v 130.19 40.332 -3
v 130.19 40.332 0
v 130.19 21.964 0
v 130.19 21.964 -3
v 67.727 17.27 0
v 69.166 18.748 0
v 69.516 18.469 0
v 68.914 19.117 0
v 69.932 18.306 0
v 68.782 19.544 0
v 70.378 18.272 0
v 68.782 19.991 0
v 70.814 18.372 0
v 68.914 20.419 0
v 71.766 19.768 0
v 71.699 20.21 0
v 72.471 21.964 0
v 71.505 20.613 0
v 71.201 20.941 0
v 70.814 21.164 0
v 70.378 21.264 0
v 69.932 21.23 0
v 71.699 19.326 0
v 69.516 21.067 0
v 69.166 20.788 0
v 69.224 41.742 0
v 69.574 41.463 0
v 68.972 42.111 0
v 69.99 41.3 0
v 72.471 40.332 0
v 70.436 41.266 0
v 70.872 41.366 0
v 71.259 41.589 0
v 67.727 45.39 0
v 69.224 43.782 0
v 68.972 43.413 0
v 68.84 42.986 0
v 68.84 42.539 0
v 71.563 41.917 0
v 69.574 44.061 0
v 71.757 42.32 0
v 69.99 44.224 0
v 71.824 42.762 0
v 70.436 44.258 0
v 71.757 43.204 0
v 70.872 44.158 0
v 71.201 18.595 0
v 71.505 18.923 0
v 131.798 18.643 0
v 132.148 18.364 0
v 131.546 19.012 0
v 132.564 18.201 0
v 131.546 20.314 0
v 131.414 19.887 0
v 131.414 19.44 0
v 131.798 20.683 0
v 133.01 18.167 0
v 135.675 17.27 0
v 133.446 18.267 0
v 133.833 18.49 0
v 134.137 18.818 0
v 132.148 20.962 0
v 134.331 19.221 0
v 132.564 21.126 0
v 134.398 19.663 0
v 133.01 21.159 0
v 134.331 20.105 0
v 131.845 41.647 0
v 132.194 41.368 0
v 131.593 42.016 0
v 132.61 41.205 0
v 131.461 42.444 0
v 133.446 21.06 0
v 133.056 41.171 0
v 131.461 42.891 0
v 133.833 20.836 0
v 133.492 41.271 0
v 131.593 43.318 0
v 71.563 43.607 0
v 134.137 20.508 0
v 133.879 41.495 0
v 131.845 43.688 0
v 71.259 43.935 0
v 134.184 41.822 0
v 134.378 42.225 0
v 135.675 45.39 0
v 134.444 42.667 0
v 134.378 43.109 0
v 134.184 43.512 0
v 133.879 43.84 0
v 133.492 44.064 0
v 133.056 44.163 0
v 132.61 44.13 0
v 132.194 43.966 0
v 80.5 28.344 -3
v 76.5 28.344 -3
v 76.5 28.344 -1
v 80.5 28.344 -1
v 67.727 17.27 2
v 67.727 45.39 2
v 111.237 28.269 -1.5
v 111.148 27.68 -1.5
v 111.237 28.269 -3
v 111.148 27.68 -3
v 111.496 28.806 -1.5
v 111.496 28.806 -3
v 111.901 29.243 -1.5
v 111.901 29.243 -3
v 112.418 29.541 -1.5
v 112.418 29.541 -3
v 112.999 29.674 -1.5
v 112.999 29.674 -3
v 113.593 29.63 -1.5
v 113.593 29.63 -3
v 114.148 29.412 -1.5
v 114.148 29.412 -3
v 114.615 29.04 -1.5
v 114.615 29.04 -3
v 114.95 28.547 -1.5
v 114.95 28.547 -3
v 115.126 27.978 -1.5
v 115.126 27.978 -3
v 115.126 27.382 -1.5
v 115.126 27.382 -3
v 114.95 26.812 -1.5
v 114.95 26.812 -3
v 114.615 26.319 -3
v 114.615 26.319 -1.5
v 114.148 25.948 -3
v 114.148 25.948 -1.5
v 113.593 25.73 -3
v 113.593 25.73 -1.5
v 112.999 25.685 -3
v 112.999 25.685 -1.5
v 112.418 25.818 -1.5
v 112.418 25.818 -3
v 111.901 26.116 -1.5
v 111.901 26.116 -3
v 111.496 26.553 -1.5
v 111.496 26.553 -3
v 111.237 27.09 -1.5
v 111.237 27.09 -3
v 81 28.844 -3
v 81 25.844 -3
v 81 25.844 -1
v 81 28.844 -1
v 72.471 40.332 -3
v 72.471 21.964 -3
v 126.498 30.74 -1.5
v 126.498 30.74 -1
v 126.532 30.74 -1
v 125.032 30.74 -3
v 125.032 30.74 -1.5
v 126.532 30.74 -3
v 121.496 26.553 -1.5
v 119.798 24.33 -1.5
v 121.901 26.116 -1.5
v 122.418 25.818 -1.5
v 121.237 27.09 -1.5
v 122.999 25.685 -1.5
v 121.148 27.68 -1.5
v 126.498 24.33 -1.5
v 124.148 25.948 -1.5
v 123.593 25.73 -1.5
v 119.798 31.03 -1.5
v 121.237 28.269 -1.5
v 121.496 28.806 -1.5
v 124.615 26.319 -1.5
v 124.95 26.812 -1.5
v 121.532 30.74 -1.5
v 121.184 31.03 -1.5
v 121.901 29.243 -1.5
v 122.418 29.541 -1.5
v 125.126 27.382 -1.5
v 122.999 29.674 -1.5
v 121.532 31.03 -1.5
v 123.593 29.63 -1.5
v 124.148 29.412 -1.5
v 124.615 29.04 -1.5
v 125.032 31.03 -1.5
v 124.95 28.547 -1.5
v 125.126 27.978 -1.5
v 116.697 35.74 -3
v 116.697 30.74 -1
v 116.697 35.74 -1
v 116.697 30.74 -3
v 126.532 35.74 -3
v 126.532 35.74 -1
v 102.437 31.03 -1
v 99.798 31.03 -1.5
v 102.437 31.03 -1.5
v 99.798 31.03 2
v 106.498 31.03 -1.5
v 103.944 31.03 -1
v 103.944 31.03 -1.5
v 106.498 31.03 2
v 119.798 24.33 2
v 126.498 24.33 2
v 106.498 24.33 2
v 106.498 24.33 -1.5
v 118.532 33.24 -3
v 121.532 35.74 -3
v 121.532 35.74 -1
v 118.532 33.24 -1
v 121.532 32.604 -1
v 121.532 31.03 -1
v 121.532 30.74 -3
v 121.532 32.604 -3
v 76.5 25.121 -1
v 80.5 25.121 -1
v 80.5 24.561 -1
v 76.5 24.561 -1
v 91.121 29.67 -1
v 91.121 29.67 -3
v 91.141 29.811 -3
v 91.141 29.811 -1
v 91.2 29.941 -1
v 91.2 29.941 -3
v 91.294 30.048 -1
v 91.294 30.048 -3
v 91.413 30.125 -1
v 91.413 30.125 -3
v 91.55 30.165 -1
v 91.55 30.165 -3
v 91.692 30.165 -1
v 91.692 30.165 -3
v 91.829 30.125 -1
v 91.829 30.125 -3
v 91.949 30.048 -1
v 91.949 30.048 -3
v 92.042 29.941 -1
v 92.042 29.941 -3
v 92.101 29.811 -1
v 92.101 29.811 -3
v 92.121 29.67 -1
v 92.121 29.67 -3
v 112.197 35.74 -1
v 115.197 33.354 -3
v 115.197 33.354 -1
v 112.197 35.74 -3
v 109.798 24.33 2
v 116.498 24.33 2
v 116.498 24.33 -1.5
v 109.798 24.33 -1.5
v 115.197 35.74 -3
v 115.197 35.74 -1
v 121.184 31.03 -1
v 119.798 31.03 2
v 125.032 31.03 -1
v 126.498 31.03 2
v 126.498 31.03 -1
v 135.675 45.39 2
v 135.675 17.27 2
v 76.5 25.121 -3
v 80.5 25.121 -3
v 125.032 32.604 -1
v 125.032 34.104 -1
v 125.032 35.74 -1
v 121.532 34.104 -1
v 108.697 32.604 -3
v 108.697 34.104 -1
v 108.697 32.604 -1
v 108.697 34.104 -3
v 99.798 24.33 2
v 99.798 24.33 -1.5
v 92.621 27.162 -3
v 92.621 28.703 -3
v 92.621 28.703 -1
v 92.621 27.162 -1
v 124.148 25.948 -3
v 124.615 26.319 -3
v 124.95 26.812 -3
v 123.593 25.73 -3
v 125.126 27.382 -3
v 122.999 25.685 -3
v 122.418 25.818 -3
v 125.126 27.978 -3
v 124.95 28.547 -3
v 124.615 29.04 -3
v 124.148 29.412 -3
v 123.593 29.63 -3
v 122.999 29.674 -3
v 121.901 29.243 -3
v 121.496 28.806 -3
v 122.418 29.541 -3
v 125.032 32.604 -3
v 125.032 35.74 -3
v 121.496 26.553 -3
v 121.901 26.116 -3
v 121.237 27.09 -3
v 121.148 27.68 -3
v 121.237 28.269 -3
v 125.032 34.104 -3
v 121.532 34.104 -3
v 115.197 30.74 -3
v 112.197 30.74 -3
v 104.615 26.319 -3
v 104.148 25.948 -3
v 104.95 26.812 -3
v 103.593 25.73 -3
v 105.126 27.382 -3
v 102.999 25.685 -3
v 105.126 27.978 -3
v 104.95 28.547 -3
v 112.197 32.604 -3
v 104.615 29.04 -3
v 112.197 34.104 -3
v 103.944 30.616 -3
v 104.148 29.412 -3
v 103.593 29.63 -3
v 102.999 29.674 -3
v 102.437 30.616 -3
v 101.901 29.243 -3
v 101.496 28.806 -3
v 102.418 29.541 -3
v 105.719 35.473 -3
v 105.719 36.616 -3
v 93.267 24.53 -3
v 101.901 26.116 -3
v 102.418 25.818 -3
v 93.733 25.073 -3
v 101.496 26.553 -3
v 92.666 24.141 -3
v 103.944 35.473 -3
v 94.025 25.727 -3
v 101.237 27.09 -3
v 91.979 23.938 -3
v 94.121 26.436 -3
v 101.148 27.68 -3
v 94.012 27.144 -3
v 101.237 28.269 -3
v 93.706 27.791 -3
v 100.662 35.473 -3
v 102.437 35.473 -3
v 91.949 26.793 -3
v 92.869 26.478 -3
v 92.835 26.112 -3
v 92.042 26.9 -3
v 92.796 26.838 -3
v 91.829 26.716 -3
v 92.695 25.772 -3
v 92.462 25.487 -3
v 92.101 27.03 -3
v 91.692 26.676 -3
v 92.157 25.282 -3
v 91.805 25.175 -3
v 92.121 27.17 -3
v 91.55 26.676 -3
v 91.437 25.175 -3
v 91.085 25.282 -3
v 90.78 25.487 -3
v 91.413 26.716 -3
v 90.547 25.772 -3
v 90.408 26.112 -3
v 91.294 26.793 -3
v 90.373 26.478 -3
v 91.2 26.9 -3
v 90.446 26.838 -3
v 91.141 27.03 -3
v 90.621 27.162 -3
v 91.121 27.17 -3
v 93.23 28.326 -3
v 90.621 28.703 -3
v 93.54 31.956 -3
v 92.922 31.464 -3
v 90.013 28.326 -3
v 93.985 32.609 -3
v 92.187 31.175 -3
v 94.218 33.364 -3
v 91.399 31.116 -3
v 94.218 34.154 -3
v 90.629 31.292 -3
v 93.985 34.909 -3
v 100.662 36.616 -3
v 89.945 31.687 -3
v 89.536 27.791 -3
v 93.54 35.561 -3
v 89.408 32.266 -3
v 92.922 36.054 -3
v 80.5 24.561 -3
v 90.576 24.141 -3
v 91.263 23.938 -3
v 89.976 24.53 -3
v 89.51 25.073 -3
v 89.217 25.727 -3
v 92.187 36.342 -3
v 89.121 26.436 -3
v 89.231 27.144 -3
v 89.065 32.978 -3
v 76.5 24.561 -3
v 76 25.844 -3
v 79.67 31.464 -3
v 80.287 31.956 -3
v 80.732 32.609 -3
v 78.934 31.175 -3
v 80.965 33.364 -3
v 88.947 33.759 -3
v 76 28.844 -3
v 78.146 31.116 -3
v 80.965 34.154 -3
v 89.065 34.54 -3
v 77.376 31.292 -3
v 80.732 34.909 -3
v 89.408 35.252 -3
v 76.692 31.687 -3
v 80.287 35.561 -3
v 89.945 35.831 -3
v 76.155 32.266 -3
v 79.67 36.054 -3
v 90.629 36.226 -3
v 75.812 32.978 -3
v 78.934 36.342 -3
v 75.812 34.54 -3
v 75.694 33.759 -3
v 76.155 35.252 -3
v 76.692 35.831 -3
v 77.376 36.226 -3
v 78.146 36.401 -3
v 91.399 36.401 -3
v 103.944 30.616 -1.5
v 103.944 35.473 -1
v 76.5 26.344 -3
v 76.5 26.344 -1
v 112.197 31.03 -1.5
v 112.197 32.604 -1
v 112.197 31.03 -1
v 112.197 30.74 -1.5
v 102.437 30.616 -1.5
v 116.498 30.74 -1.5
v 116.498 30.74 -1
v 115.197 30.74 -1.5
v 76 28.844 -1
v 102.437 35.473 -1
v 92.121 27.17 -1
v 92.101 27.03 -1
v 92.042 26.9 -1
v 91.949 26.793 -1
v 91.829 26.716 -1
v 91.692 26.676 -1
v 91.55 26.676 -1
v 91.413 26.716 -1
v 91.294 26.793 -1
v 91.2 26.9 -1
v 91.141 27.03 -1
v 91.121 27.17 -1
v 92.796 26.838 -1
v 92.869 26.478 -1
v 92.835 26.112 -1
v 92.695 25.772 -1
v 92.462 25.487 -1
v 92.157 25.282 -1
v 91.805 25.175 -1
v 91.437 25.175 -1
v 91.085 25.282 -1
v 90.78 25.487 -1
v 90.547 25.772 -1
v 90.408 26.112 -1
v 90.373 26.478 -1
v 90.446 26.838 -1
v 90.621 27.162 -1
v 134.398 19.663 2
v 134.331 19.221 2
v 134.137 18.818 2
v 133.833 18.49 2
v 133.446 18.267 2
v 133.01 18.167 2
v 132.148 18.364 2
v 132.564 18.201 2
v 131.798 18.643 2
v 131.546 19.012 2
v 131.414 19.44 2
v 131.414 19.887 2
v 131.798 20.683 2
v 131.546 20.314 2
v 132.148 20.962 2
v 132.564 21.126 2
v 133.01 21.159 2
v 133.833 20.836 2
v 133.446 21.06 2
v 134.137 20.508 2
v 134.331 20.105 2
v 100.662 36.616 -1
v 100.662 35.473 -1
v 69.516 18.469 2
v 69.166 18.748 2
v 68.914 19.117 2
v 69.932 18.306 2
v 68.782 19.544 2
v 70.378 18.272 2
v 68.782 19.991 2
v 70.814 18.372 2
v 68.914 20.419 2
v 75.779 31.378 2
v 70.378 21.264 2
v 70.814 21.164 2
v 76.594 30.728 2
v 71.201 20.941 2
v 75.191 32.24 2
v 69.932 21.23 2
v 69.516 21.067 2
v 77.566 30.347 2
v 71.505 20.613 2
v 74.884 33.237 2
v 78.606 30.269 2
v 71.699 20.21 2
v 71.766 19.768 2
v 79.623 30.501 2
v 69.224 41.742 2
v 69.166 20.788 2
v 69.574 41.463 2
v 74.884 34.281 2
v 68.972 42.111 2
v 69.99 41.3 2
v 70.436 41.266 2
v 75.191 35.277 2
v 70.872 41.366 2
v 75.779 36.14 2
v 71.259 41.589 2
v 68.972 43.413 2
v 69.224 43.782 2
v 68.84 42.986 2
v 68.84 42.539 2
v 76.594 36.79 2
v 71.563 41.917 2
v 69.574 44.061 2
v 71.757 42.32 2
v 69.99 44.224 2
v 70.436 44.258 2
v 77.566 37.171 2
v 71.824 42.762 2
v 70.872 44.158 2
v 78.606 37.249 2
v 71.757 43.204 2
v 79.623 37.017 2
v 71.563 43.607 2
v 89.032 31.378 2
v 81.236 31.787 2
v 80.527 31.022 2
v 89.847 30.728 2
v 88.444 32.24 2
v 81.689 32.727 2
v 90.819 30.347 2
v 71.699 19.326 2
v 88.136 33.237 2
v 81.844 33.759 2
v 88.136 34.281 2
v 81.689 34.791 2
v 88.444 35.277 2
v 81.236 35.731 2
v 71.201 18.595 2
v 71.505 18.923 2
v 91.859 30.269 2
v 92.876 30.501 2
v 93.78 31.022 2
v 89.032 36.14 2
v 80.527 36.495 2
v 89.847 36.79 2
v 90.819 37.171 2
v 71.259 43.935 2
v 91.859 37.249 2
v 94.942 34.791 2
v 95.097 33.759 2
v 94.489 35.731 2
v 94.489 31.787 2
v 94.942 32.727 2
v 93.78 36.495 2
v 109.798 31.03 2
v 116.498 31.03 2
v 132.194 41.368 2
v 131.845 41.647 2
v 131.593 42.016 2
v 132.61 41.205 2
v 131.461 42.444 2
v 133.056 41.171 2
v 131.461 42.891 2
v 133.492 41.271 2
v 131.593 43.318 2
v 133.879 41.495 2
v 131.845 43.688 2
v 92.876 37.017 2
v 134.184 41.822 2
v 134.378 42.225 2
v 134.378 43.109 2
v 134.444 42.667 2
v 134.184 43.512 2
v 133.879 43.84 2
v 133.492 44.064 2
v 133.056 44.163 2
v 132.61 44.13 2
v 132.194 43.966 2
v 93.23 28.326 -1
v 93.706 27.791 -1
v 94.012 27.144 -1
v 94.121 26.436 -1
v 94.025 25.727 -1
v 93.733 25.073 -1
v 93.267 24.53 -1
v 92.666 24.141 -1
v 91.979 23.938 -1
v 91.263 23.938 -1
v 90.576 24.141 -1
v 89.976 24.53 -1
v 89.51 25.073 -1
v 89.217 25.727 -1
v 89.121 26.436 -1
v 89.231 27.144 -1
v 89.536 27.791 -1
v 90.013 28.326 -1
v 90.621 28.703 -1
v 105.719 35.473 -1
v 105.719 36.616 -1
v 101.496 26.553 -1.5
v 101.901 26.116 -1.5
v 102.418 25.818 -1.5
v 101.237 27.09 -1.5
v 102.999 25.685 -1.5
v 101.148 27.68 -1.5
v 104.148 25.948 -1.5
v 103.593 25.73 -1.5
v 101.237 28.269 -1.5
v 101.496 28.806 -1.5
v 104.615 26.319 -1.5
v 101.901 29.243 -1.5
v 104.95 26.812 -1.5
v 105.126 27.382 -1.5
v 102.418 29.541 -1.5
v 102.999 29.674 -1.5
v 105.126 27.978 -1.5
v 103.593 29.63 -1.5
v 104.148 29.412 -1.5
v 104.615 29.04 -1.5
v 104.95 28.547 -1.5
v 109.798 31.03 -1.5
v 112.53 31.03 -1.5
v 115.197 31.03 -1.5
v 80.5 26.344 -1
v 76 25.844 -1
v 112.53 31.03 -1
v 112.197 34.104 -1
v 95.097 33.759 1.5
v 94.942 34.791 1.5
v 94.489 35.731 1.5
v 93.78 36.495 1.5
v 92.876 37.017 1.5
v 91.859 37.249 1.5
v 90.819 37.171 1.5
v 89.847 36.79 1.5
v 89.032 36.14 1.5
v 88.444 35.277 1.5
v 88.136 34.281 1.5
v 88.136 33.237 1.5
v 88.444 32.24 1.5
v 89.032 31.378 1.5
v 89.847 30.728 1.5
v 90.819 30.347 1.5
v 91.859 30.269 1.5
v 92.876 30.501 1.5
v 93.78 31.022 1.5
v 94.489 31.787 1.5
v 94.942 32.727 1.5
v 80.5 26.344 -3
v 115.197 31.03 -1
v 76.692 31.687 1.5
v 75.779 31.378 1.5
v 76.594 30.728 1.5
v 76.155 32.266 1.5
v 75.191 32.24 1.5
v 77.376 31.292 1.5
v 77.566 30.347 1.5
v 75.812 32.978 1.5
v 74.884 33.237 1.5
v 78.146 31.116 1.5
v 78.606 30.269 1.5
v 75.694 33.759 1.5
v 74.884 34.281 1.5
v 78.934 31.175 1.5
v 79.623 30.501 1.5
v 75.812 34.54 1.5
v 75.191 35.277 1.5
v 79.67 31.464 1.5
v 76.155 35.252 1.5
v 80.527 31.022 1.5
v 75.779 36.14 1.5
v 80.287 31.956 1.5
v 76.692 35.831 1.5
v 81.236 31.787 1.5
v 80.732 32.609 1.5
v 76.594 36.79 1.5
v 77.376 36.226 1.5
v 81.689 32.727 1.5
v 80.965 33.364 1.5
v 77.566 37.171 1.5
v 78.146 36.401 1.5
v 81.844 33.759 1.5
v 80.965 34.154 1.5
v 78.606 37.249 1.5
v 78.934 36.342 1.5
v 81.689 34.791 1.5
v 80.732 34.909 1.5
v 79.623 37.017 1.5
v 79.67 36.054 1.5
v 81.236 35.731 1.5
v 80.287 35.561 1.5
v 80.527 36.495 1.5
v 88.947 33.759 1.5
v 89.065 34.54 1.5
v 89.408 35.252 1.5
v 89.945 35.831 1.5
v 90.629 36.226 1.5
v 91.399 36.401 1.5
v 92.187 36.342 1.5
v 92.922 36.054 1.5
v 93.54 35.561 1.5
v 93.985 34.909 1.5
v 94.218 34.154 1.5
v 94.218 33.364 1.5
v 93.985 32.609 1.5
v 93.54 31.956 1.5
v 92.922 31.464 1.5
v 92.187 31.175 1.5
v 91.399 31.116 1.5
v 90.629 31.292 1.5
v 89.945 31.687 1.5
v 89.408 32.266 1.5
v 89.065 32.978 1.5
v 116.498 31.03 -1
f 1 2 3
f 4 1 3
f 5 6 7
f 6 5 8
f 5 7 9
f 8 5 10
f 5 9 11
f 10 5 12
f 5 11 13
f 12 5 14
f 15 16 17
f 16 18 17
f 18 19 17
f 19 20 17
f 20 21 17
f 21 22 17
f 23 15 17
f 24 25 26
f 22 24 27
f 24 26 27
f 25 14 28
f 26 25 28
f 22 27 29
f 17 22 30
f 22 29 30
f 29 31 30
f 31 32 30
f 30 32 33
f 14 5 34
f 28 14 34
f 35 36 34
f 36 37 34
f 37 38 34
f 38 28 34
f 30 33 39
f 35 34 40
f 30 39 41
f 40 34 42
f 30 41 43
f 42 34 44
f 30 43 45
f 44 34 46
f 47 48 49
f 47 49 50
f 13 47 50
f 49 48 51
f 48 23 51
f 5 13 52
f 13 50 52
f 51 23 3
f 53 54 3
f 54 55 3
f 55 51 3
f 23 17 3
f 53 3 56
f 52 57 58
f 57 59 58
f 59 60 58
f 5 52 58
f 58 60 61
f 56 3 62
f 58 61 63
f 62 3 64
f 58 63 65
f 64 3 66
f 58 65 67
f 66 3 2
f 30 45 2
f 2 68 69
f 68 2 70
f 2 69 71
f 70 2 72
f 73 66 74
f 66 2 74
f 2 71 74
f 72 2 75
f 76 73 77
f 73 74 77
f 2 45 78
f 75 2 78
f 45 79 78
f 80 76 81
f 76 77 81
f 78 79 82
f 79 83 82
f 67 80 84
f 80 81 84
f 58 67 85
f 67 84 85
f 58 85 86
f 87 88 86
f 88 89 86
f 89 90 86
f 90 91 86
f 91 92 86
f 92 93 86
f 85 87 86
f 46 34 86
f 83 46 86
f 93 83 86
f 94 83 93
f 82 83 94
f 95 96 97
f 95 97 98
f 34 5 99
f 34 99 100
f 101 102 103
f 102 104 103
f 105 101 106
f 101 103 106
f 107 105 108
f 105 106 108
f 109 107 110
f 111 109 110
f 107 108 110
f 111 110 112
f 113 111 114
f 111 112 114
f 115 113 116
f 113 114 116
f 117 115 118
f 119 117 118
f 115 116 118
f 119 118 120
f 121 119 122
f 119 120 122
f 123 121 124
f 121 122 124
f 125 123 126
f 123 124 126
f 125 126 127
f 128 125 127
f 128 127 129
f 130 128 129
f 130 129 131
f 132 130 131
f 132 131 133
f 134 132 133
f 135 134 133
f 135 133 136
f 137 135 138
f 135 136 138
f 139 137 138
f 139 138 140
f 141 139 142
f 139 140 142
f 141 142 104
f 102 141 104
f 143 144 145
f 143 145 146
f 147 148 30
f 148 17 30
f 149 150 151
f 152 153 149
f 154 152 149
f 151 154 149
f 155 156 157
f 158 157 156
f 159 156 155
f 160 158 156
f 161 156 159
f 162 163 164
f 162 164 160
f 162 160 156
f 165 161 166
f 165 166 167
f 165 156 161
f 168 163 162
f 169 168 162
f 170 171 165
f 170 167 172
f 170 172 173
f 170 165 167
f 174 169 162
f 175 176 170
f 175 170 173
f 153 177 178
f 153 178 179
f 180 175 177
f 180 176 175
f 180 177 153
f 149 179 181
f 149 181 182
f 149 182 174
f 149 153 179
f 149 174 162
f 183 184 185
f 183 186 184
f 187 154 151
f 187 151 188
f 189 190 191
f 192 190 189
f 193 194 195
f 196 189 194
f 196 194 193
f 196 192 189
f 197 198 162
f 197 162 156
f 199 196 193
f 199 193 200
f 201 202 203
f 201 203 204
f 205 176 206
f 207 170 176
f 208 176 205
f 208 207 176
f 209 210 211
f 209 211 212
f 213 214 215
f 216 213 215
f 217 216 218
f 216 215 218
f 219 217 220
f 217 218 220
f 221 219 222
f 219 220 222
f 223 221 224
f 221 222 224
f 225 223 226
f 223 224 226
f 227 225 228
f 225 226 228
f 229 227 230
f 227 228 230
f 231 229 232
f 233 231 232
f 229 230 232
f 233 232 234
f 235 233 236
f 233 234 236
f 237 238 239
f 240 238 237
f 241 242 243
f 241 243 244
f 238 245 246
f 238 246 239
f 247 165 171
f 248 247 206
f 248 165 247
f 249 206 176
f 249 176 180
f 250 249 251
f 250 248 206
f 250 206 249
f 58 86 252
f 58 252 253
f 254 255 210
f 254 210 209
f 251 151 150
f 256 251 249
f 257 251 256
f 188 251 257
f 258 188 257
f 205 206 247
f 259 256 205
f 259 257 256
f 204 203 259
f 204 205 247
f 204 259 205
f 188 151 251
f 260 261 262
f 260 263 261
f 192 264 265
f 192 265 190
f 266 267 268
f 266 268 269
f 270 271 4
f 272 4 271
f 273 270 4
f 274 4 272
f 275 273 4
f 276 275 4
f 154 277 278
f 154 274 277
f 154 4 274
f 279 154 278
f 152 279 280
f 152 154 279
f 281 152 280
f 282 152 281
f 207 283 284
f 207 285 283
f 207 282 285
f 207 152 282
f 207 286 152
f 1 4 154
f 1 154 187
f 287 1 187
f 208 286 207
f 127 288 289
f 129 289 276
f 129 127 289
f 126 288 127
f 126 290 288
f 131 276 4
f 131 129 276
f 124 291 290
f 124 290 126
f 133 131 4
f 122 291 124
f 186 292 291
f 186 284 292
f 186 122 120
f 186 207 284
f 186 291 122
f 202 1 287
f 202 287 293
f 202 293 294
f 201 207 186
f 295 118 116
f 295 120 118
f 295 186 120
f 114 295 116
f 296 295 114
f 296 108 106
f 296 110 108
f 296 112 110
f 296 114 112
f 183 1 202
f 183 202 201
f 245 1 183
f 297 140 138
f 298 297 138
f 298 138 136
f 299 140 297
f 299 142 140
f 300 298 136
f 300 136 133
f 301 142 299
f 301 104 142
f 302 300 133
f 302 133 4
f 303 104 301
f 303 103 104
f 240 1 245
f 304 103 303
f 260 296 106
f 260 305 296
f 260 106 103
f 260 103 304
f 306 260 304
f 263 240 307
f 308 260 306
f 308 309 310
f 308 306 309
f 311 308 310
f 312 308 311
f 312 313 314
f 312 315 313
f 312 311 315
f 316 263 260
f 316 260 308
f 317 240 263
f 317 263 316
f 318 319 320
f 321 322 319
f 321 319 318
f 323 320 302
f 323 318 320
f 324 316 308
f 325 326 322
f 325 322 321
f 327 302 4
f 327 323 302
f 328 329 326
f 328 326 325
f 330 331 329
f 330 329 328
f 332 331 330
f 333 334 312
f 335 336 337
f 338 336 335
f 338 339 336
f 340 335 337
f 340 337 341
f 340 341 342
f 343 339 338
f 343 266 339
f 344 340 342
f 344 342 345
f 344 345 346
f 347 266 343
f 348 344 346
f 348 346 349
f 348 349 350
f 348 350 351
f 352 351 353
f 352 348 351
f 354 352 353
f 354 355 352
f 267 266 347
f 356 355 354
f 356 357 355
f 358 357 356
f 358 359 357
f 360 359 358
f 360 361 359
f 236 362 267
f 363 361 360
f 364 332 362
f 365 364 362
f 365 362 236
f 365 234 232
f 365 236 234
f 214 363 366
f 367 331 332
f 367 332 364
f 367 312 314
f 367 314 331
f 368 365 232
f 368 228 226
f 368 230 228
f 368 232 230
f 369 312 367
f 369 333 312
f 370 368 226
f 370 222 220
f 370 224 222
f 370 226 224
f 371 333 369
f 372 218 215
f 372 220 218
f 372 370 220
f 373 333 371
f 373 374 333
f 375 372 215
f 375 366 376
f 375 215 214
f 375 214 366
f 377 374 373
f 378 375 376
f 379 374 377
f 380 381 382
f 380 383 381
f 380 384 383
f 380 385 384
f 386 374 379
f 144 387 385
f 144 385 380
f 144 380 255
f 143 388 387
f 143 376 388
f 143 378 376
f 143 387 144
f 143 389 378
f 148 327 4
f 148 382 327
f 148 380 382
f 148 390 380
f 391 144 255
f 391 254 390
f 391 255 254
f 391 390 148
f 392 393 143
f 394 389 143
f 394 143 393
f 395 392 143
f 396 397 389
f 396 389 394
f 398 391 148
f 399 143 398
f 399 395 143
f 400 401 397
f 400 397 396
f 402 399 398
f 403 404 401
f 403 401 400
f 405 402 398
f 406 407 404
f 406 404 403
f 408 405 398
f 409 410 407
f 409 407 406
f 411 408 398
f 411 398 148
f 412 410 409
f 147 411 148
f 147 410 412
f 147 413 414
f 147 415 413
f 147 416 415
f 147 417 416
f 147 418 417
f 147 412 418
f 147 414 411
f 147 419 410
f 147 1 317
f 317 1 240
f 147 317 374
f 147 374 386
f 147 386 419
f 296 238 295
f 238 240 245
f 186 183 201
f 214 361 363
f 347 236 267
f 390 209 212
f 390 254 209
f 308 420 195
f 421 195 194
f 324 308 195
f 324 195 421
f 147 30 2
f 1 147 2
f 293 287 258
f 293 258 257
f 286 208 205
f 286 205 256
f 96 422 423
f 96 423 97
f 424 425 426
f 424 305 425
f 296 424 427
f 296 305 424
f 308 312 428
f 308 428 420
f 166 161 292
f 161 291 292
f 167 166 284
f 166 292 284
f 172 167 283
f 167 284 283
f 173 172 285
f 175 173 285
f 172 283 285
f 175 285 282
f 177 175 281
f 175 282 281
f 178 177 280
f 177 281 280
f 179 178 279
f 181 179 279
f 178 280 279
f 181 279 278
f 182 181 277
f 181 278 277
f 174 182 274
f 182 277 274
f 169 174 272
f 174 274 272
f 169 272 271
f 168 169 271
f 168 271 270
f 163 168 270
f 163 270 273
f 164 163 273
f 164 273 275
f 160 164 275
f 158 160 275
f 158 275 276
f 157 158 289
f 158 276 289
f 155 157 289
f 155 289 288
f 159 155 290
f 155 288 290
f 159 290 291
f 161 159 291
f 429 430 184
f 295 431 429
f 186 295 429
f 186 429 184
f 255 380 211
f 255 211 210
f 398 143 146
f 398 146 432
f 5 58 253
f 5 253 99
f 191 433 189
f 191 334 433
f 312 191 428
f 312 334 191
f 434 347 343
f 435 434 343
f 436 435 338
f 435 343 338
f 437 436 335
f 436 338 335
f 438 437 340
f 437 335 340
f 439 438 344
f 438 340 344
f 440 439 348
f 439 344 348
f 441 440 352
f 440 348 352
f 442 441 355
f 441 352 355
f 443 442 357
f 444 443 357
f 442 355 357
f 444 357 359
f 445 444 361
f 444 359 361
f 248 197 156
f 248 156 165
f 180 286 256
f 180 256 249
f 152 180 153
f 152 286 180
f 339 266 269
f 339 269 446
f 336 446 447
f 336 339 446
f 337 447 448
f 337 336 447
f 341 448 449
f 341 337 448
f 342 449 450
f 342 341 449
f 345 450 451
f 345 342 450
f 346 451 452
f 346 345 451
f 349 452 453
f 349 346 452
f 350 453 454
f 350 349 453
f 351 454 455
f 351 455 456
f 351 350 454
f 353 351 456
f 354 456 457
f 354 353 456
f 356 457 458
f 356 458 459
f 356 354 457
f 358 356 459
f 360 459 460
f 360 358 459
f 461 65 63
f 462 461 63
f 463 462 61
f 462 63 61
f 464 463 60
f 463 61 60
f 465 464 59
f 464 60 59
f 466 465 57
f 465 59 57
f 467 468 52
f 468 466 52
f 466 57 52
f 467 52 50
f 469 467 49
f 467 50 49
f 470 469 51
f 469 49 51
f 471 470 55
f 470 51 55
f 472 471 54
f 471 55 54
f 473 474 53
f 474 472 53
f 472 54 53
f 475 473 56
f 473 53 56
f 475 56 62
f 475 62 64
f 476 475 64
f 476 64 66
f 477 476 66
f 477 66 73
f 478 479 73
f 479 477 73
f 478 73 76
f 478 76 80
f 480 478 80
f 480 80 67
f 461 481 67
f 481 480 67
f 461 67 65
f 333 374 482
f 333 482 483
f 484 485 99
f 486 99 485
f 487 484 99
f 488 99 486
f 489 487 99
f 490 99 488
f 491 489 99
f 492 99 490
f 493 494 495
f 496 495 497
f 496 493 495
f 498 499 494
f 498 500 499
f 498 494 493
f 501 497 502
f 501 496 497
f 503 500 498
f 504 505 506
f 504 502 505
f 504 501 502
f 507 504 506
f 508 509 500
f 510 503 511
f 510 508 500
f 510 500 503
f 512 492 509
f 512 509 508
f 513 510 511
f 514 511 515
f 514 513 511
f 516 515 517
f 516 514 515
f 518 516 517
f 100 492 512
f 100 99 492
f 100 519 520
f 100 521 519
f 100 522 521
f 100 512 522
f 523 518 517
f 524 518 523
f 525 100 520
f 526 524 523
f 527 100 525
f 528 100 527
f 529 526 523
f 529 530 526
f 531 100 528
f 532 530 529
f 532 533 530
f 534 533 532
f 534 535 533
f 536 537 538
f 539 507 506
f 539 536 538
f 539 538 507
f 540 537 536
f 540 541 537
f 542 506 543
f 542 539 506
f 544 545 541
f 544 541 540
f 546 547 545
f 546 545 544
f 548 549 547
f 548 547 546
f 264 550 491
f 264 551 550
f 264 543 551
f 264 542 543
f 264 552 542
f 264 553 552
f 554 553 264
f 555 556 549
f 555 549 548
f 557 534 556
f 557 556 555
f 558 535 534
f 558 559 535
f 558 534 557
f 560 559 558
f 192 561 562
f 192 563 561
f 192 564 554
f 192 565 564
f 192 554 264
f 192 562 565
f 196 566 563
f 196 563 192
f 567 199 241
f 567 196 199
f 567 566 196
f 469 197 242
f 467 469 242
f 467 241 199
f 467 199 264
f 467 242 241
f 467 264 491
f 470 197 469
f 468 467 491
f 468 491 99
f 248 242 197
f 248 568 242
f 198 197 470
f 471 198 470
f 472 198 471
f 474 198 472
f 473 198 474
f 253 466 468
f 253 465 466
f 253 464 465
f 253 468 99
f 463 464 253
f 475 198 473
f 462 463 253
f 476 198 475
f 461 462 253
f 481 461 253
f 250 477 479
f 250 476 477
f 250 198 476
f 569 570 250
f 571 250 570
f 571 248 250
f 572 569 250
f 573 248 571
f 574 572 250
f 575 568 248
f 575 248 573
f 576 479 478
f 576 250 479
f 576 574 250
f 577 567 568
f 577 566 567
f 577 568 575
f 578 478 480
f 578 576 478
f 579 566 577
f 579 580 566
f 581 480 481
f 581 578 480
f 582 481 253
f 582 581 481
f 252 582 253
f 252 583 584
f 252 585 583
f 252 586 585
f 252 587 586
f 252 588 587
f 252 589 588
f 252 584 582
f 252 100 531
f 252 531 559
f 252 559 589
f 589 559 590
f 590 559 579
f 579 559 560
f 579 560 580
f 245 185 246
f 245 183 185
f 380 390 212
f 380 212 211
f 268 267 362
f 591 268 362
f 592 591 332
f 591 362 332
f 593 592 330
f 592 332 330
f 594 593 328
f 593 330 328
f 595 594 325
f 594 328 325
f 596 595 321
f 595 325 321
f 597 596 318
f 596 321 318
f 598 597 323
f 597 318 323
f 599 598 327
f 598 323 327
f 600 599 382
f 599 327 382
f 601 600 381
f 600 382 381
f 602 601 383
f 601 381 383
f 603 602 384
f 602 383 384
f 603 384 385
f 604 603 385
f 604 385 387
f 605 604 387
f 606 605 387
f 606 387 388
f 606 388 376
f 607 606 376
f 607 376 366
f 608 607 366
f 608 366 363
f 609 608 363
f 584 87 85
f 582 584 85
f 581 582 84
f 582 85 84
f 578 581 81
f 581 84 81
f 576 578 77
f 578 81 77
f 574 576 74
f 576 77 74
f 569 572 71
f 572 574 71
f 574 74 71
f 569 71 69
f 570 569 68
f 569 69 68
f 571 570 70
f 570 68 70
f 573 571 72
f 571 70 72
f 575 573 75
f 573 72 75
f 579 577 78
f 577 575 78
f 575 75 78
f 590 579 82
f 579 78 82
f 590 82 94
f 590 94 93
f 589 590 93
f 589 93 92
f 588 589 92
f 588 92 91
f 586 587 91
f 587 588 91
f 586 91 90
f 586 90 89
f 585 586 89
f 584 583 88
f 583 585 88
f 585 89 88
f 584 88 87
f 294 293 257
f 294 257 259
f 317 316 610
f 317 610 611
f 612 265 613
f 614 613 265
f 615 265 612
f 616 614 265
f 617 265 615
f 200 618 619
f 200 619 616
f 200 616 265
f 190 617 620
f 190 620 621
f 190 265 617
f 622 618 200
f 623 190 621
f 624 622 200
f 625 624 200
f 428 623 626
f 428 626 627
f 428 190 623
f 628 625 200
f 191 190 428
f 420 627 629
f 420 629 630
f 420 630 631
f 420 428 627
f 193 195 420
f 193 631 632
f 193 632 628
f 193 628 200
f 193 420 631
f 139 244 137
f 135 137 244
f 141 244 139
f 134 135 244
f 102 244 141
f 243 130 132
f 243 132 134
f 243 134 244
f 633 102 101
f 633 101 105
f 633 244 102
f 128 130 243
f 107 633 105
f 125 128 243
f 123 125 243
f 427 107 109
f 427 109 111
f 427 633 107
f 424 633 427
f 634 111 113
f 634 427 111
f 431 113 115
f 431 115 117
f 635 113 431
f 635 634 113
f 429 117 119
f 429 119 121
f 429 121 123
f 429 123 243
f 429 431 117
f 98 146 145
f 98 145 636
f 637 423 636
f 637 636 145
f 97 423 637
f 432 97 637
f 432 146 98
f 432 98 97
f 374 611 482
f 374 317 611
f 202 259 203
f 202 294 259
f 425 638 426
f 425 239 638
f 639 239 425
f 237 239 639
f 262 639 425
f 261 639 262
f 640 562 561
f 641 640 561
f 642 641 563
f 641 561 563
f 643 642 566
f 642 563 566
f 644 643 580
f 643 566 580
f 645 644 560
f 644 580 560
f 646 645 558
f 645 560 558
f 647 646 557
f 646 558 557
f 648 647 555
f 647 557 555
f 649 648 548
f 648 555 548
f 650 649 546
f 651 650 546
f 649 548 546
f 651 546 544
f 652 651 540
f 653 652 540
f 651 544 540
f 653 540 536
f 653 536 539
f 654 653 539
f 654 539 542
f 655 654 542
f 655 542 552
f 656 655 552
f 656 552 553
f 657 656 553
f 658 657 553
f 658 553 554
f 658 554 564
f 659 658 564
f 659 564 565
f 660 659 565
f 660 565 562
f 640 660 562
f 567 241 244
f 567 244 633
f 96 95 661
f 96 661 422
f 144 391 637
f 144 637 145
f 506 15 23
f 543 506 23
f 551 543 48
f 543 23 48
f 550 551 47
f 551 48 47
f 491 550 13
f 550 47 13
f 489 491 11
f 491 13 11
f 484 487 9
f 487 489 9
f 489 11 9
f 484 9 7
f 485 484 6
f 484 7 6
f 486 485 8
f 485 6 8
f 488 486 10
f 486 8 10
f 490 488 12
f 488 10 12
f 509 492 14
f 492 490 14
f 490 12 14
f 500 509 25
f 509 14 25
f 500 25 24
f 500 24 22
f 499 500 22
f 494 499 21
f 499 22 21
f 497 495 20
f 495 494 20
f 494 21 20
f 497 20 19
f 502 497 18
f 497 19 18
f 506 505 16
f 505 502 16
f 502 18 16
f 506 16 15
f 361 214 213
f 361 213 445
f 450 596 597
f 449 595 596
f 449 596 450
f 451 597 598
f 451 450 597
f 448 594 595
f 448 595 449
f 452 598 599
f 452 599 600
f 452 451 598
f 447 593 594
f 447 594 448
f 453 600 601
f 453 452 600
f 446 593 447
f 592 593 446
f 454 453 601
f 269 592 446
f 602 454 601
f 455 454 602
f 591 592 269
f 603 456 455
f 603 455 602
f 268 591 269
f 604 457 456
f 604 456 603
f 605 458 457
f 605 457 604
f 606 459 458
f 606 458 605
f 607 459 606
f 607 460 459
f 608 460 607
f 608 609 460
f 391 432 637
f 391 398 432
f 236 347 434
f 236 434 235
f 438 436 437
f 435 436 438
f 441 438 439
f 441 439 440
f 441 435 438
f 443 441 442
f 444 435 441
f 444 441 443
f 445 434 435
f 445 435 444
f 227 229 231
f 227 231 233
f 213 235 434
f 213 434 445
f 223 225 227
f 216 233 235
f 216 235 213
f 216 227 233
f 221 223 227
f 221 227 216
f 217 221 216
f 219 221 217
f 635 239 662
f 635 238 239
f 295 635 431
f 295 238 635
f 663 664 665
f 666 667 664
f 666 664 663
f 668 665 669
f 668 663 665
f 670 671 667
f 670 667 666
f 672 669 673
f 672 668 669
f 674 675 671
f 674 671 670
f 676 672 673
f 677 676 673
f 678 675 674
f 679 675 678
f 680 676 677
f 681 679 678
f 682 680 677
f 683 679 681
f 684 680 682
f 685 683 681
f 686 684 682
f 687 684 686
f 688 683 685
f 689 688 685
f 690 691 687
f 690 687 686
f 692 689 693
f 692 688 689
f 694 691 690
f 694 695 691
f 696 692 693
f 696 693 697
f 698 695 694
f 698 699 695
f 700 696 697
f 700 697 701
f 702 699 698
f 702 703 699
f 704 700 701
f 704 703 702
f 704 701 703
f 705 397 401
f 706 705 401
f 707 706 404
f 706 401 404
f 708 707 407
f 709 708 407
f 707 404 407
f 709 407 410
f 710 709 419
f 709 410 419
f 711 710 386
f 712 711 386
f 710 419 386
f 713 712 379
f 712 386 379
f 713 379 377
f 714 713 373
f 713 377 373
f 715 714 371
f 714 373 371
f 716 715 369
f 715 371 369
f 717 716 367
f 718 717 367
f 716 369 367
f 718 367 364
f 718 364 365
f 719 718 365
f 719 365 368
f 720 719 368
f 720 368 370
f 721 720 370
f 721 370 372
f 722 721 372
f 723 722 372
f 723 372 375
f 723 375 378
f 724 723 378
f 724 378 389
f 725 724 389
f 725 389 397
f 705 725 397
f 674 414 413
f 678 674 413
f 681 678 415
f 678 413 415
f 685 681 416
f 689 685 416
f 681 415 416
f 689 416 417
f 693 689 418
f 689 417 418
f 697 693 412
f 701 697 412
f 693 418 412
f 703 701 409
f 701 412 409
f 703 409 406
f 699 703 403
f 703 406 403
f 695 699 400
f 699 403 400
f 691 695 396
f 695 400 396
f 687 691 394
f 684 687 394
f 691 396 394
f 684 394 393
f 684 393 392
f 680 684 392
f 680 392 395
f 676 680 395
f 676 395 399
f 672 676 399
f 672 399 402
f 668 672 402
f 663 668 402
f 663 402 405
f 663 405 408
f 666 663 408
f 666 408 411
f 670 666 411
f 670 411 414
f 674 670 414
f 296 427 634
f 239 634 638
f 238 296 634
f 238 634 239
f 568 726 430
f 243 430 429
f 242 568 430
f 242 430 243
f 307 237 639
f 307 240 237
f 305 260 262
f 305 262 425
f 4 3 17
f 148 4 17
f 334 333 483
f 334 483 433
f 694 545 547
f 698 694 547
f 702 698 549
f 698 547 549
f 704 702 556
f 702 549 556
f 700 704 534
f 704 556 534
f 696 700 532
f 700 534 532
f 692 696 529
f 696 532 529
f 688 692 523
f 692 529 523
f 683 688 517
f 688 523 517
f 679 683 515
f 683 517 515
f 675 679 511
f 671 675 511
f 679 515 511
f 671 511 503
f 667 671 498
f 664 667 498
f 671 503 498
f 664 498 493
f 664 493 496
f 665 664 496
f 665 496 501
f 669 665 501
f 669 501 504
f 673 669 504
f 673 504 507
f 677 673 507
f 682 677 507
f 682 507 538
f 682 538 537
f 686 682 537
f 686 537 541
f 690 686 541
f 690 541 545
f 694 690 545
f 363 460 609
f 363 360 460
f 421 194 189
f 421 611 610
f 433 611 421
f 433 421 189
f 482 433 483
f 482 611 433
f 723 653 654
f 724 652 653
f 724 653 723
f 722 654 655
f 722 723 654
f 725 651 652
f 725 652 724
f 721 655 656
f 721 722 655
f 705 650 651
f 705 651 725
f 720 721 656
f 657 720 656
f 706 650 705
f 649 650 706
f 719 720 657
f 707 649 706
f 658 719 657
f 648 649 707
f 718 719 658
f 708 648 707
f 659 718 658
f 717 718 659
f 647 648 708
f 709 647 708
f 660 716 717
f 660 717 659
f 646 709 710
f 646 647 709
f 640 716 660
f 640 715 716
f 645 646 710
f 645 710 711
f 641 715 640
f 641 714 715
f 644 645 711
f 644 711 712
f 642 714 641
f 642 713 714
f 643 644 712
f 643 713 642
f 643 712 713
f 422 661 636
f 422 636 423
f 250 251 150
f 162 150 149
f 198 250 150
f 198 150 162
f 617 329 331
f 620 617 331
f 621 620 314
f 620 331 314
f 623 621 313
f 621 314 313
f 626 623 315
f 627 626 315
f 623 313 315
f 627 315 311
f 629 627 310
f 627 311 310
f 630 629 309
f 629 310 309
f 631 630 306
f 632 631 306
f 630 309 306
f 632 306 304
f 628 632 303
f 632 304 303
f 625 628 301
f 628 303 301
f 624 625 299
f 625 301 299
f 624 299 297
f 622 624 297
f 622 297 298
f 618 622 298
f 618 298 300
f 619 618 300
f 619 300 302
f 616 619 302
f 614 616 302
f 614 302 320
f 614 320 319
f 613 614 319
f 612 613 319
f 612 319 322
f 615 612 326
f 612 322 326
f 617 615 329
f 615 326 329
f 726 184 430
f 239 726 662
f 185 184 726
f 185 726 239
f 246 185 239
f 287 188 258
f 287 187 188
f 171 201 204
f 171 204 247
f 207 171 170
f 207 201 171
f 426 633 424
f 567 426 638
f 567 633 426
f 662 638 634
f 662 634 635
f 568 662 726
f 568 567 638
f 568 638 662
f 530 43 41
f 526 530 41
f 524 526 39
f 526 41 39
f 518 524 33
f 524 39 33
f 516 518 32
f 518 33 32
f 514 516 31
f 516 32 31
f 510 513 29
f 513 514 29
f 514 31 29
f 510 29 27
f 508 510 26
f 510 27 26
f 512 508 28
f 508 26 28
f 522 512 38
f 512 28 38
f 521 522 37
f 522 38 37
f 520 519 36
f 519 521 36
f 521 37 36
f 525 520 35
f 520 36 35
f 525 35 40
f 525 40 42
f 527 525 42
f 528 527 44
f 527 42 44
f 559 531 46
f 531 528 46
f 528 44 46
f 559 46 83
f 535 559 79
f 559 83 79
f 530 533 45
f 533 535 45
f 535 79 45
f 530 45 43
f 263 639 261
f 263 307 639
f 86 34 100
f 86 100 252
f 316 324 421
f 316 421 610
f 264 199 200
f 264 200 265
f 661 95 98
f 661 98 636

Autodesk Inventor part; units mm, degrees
ref_plane "YZ Plane" through (0, 0, 0) normal (1, 0, 0) x (0, 1, 0)
ref_plane "XZ Plane" through (0, 0, 0) normal (0, 1, 0) x (-1, 0, 0)
ref_plane "XY Plane" through (0, 0, 0) normal (0, 0, 1) x (1, 0, 0)
ref_plane "Work Plane1" through (0, 0, 0) normal (0, 0, 1) x (1, 0, 0)
sketch "Sketch1" plane through (0, 0, 0) normal (0, 0, 1) x (1, 0, 0)
  line L0 (67.7271, 45.3897) -> (135.6749, 45.3897)
  line L1 (135.6749, 45.3897) -> (135.6749, 17.2701)
  line L2 (135.6749, 17.2701) -> (67.7271, 17.2701)
  line L3 (67.7271, 17.2701) -> (67.7271, 45.3897)
  circle A0 centre (70.3236, 42.7621) radius 1.5
  circle A1 centre (70.2655, 19.7679) radius 1.5
  circle A2 centre (132.8977, 19.6632) radius 1.5
  circle A3 centre (132.9442, 42.6673) radius 1.5
  point P0 (0, 0)
  dimension "d0" = 3
  dimension "d1" = 3
  dimension "d2" = 3
  dimension "d3" = 3
extrude "Extrusion1" add sketch "Sketch1" along normal blind 2
sketch "Sketch2" plane through (0, 0, 0) normal (0, 0, -1) x (-1, 0, 0)
  line L0 (-130.1897, 21.9638) -> (-72.4709, 21.9638)
  line L1 (-72.4709, 21.9638) -> (-72.4709, 40.332)
  line L2 (-72.4709, 40.332) -> (-130.1897, 40.332)
  line L3 (-130.1897, 40.332) -> (-130.1897, 21.9638)
  point P0 (0, 0)
extrude "Extrusion2" add sketch "Sketch2" along normal blind 3
sketch "Sketch3" plane through (0, 0, -3) normal (0, 0, -1) x (-1, 0, 0)
  circle A0 centre (-123.1484, 27.6797) radius 2
  line L0 (-121.6186, 32.121) -> (-111.2555, 32.121)
  circle A1 centre (-113.1484, 27.6797) radius 2
  circle A2 centre (-103.1484, 27.6797) radius 2
  circle A3 centre (-91.5974, 33.7589) radius 2.65
  circle A4 centre (-78.3445, 33.7589) radius 2.65
  point P0 (0, 0)
  dimension "d8" = 4
  dimension "d11" = 10
  dimension "d16" = 5.3
  dimension "d17" = 5.3
extrude "Extrusion3" cut sketch "Sketch3" against normal up to surface (5 mm away)
sketch "Sketch5" plane through (0, 0, 2) normal (0, 0, 1) x (1, 0, 0)
  circle A0 centre (78.3445, 33.7589) radius 2.65 projected
  circle A1 centre (78.3445, 33.7589) radius 3.5
  circle A2 centre (91.5974, 33.7589) radius 2.65 projected
  circle A3 centre (91.5974, 33.7589) radius 3.5
  point P0 (0, 0)
  dimension "d22" = 7
  dimension "d23" = 7
extrude "Extrusion5" cut sketch "Sketch5" against normal blind 0.5
sketch "Sketch6" plane through (0, 0, 2) normal (0, 0, 1) x (1, 0, 0)
  line L0 (99.7984, 31.0297) -> (106.4984, 31.0297)
  line L1 (106.4984, 31.0297) -> (106.4984, 24.3297)
  line L2 (106.4984, 24.3297) -> (99.7984, 24.3297)
  line L3 (99.7984, 24.3297) -> (99.7984, 31.0297)
  circle A0 centre (103.1484, 27.6797) radius 2 projected
  line L4 (109.7984, 31.0297) -> (116.4984, 31.0297)
  line L5 (116.4984, 31.0297) -> (116.4984, 24.3297)
  line L6 (116.4984, 24.3297) -> (109.7984, 24.3297)
  line L7 (109.7984, 24.3297) -> (109.7984, 31.0297)
  line L8 (119.7984, 31.0297) -> (126.4984, 31.0297)
  line L9 (126.4984, 31.0297) -> (126.4984, 24.3297)
  line L10 (126.4984, 24.3297) -> (119.7984, 24.3297)
  line L11 (119.7984, 24.3297) -> (119.7984, 31.0297)
  circle A1 centre (113.1484, 27.6797) radius 2 projected
  circle A2 centre (123.1484, 27.6797) radius 2 projected
  point P0 (0, 0)
  dimension "d26" = 6.7
  dimension "d27" = 6.7
  dimension "d28" = 3.35
  dimension "d29" = 3.35
  dimension "d30" = 6.7
  dimension "d31" = 6.7
  dimension "d32" = 6.7
  dimension "d33" = 6.7
  dimension "d34" = 3.35
  dimension "d35" = 3.35
  dimension "d36" = 3.35
  dimension "d37" = 3.35
extrude "Extrusion6" cut sketch "Sketch6" against normal blind 3.5
sketch "Sketch7" plane through (0, 0, -3) normal (0, 0, -1) x (-1, 0, 0)
  circle A0 centre (-103.1484, 27.6797) radius 2 projected
  circle A1 centre (-91.5974, 33.7589) radius 2.65 projected
  circle A2 centre (-123.1484, 27.6797) radius 2 projected
  circle A3 centre (-78.3445, 33.7589) radius 2.65 projected
  circle A4 centre (-113.1484, 27.6797) radius 2 projected
  line L0 (-72.4709, 21.9638) -> (-130.1897, 21.9638) projected
  line L1 (-130.1897, 21.9638) -> (-130.1897, 40.332) projected
  line L2 (-130.1897, 40.332) -> (-72.4709, 40.332) projected
  line L3 (-72.4709, 40.332) -> (-72.4709, 21.9638) projected
  line L4 (-125.0325, 30.7395) -> (-126.5325, 30.7395)
  line L5 (-126.5325, 30.7395) -> (-126.5325, 35.7395)
  line L6 (-126.5325, 35.7395) -> (-125.0325, 35.7395)
  line L7 (-125.0325, 35.7395) -> (-125.0325, 34.1042)
  line L8 (-125.0325, 34.1042) -> (-121.5325, 34.1042)
  line L9 (-121.5325, 34.1042) -> (-121.5325, 35.7395)
  line L10 (-121.5325, 35.7395) -> (-118.5325, 33.2395)
  line L11 (-118.5325, 33.2395) -> (-121.5325, 30.7395)
  line L12 (-121.5325, 30.7395) -> (-121.5325, 32.6042)
  line L13 (-121.5325, 32.6042) -> (-125.0325, 32.6042)
  line L14 (-125.0325, 32.6042) -> (-125.0325, 30.7395)
  line L15 (-115.197, 30.7395) -> (-116.697, 30.7395)
  line L16 (-116.697, 30.7395) -> (-116.697, 35.7395)
  line L17 (-116.697, 35.7395) -> (-115.197, 35.7395)
  line L18 (-115.197, 35.7395) -> (-115.197, 33.3542)
  line L19 (-115.197, 33.3542) -> (-112.197, 35.7395)
  line L20 (-112.197, 35.7395) -> (-112.197, 34.1042)
  line L21 (-112.197, 34.1042) -> (-108.697, 34.1042)
  line L22 (-108.697, 34.1042) -> (-108.697, 32.6042)
  line L23 (-108.697, 32.6042) -> (-112.197, 32.6042)
  line L24 (-112.197, 32.6042) -> (-112.197, 30.7395)
  line L25 (-112.197, 30.7395) -> (-115.197, 33.3542)
  line L26 (-115.197, 33.3542) -> (-115.197, 30.7395)
  line L27 (-76.5, 25.1213) -> (-76.5, 24.561)
  line L28 (-76.5, 24.561) -> (-80.5, 24.561)
  line L29 (-80.5, 24.561) -> (-80.5, 25.1213)
  line L30 (-80.5, 25.1213) -> (-76.5, 25.1213)
  line L31 (-92.6211, 28.7032) -> (-92.6211, 27.1619)
  arc A5 (-92.6211, 27.1619) -> (-90.6211, 27.1619) centre (-91.6211, 26.4119) ccw
  line L32 (-90.6211, 27.1619) -> (-90.6211, 28.7032)
  arc A6 (-92.6211, 28.7032) -> (-90.6211, 28.7032) centre (-91.6211, 26.4119) ccw
  line L33 (-76.5, 26.3443) -> (-76.5, 28.3443)
  line L34 (-76.5, 28.3443) -> (-80.5, 28.3443)
  line L35 (-80.5, 28.3443) -> (-80.5, 26.3443)
  line L36 (-80.5, 26.3443) -> (-76.5, 26.3443)
  line L37 (-76, 28.8443) -> (-76, 25.8443)
  line L38 (-76, 25.8443) -> (-81, 25.8443)
  line L39 (-81, 25.8443) -> (-81, 28.8443)
  line L40 (-81, 28.8443) -> (-76, 28.8443)
  line L41 (-91.1211, 29.6705) -> (-91.1211, 27.1705)
  arc A7 (-92.1211, 27.1705) -> (-91.1211, 27.1705) centre (-91.6211, 27.1705) ccw
  line L42 (-92.1211, 27.1705) -> (-92.1211, 29.6705)
  arc A8 (-91.1211, 29.6705) -> (-92.1211, 29.6705) centre (-91.6211, 29.6705) ccw
  line L43 (-102.4368, 30.616) -> (-103.9441, 30.616)
  line L44 (-103.9441, 30.616) -> (-103.9441, 35.4734)
  line L45 (-103.9441, 35.4734) -> (-105.7188, 35.4734)
  line L46 (-105.7188, 35.4734) -> (-105.7188, 36.616)
  line L47 (-105.7188, 36.616) -> (-100.6621, 36.616)
  line L48 (-100.6621, 36.616) -> (-100.6621, 35.4734)
  line L49 (-100.6621, 35.4734) -> (-102.4368, 35.4734)
  line L50 (-102.4368, 35.4734) -> (-102.4368, 30.616)
  point P0 (0, 0)
extrude "Extrusion7" cut sketch "Sketch7" against normal blind 2 contours L4 L5 L6 L7 L8 L9 L10 L11 L12 L13 L14 | L19 L20 L21 L22 L23 L24 L25 | L15 L16 L17 L18 L26 | L27 L28 L29 L30 | L31 A5 L32 A6 | L37 L38 L39 L40 | L41 A7 L42 A8 | L43 L44 L45 L46 L47 L48 L49 L50
equation "\"d28\" = 0.5 * d26"
equation "\"d29\" = 0.5 * d27"
equation "\"d34\" = 0.5 * d31"
equation "\"d35\" = 0.5 * d33"
equation "\"d36\" = 0.5 * d30"
equation "\"d37\" = 0.5 * d32"
properties part number "InterfacePlate"
